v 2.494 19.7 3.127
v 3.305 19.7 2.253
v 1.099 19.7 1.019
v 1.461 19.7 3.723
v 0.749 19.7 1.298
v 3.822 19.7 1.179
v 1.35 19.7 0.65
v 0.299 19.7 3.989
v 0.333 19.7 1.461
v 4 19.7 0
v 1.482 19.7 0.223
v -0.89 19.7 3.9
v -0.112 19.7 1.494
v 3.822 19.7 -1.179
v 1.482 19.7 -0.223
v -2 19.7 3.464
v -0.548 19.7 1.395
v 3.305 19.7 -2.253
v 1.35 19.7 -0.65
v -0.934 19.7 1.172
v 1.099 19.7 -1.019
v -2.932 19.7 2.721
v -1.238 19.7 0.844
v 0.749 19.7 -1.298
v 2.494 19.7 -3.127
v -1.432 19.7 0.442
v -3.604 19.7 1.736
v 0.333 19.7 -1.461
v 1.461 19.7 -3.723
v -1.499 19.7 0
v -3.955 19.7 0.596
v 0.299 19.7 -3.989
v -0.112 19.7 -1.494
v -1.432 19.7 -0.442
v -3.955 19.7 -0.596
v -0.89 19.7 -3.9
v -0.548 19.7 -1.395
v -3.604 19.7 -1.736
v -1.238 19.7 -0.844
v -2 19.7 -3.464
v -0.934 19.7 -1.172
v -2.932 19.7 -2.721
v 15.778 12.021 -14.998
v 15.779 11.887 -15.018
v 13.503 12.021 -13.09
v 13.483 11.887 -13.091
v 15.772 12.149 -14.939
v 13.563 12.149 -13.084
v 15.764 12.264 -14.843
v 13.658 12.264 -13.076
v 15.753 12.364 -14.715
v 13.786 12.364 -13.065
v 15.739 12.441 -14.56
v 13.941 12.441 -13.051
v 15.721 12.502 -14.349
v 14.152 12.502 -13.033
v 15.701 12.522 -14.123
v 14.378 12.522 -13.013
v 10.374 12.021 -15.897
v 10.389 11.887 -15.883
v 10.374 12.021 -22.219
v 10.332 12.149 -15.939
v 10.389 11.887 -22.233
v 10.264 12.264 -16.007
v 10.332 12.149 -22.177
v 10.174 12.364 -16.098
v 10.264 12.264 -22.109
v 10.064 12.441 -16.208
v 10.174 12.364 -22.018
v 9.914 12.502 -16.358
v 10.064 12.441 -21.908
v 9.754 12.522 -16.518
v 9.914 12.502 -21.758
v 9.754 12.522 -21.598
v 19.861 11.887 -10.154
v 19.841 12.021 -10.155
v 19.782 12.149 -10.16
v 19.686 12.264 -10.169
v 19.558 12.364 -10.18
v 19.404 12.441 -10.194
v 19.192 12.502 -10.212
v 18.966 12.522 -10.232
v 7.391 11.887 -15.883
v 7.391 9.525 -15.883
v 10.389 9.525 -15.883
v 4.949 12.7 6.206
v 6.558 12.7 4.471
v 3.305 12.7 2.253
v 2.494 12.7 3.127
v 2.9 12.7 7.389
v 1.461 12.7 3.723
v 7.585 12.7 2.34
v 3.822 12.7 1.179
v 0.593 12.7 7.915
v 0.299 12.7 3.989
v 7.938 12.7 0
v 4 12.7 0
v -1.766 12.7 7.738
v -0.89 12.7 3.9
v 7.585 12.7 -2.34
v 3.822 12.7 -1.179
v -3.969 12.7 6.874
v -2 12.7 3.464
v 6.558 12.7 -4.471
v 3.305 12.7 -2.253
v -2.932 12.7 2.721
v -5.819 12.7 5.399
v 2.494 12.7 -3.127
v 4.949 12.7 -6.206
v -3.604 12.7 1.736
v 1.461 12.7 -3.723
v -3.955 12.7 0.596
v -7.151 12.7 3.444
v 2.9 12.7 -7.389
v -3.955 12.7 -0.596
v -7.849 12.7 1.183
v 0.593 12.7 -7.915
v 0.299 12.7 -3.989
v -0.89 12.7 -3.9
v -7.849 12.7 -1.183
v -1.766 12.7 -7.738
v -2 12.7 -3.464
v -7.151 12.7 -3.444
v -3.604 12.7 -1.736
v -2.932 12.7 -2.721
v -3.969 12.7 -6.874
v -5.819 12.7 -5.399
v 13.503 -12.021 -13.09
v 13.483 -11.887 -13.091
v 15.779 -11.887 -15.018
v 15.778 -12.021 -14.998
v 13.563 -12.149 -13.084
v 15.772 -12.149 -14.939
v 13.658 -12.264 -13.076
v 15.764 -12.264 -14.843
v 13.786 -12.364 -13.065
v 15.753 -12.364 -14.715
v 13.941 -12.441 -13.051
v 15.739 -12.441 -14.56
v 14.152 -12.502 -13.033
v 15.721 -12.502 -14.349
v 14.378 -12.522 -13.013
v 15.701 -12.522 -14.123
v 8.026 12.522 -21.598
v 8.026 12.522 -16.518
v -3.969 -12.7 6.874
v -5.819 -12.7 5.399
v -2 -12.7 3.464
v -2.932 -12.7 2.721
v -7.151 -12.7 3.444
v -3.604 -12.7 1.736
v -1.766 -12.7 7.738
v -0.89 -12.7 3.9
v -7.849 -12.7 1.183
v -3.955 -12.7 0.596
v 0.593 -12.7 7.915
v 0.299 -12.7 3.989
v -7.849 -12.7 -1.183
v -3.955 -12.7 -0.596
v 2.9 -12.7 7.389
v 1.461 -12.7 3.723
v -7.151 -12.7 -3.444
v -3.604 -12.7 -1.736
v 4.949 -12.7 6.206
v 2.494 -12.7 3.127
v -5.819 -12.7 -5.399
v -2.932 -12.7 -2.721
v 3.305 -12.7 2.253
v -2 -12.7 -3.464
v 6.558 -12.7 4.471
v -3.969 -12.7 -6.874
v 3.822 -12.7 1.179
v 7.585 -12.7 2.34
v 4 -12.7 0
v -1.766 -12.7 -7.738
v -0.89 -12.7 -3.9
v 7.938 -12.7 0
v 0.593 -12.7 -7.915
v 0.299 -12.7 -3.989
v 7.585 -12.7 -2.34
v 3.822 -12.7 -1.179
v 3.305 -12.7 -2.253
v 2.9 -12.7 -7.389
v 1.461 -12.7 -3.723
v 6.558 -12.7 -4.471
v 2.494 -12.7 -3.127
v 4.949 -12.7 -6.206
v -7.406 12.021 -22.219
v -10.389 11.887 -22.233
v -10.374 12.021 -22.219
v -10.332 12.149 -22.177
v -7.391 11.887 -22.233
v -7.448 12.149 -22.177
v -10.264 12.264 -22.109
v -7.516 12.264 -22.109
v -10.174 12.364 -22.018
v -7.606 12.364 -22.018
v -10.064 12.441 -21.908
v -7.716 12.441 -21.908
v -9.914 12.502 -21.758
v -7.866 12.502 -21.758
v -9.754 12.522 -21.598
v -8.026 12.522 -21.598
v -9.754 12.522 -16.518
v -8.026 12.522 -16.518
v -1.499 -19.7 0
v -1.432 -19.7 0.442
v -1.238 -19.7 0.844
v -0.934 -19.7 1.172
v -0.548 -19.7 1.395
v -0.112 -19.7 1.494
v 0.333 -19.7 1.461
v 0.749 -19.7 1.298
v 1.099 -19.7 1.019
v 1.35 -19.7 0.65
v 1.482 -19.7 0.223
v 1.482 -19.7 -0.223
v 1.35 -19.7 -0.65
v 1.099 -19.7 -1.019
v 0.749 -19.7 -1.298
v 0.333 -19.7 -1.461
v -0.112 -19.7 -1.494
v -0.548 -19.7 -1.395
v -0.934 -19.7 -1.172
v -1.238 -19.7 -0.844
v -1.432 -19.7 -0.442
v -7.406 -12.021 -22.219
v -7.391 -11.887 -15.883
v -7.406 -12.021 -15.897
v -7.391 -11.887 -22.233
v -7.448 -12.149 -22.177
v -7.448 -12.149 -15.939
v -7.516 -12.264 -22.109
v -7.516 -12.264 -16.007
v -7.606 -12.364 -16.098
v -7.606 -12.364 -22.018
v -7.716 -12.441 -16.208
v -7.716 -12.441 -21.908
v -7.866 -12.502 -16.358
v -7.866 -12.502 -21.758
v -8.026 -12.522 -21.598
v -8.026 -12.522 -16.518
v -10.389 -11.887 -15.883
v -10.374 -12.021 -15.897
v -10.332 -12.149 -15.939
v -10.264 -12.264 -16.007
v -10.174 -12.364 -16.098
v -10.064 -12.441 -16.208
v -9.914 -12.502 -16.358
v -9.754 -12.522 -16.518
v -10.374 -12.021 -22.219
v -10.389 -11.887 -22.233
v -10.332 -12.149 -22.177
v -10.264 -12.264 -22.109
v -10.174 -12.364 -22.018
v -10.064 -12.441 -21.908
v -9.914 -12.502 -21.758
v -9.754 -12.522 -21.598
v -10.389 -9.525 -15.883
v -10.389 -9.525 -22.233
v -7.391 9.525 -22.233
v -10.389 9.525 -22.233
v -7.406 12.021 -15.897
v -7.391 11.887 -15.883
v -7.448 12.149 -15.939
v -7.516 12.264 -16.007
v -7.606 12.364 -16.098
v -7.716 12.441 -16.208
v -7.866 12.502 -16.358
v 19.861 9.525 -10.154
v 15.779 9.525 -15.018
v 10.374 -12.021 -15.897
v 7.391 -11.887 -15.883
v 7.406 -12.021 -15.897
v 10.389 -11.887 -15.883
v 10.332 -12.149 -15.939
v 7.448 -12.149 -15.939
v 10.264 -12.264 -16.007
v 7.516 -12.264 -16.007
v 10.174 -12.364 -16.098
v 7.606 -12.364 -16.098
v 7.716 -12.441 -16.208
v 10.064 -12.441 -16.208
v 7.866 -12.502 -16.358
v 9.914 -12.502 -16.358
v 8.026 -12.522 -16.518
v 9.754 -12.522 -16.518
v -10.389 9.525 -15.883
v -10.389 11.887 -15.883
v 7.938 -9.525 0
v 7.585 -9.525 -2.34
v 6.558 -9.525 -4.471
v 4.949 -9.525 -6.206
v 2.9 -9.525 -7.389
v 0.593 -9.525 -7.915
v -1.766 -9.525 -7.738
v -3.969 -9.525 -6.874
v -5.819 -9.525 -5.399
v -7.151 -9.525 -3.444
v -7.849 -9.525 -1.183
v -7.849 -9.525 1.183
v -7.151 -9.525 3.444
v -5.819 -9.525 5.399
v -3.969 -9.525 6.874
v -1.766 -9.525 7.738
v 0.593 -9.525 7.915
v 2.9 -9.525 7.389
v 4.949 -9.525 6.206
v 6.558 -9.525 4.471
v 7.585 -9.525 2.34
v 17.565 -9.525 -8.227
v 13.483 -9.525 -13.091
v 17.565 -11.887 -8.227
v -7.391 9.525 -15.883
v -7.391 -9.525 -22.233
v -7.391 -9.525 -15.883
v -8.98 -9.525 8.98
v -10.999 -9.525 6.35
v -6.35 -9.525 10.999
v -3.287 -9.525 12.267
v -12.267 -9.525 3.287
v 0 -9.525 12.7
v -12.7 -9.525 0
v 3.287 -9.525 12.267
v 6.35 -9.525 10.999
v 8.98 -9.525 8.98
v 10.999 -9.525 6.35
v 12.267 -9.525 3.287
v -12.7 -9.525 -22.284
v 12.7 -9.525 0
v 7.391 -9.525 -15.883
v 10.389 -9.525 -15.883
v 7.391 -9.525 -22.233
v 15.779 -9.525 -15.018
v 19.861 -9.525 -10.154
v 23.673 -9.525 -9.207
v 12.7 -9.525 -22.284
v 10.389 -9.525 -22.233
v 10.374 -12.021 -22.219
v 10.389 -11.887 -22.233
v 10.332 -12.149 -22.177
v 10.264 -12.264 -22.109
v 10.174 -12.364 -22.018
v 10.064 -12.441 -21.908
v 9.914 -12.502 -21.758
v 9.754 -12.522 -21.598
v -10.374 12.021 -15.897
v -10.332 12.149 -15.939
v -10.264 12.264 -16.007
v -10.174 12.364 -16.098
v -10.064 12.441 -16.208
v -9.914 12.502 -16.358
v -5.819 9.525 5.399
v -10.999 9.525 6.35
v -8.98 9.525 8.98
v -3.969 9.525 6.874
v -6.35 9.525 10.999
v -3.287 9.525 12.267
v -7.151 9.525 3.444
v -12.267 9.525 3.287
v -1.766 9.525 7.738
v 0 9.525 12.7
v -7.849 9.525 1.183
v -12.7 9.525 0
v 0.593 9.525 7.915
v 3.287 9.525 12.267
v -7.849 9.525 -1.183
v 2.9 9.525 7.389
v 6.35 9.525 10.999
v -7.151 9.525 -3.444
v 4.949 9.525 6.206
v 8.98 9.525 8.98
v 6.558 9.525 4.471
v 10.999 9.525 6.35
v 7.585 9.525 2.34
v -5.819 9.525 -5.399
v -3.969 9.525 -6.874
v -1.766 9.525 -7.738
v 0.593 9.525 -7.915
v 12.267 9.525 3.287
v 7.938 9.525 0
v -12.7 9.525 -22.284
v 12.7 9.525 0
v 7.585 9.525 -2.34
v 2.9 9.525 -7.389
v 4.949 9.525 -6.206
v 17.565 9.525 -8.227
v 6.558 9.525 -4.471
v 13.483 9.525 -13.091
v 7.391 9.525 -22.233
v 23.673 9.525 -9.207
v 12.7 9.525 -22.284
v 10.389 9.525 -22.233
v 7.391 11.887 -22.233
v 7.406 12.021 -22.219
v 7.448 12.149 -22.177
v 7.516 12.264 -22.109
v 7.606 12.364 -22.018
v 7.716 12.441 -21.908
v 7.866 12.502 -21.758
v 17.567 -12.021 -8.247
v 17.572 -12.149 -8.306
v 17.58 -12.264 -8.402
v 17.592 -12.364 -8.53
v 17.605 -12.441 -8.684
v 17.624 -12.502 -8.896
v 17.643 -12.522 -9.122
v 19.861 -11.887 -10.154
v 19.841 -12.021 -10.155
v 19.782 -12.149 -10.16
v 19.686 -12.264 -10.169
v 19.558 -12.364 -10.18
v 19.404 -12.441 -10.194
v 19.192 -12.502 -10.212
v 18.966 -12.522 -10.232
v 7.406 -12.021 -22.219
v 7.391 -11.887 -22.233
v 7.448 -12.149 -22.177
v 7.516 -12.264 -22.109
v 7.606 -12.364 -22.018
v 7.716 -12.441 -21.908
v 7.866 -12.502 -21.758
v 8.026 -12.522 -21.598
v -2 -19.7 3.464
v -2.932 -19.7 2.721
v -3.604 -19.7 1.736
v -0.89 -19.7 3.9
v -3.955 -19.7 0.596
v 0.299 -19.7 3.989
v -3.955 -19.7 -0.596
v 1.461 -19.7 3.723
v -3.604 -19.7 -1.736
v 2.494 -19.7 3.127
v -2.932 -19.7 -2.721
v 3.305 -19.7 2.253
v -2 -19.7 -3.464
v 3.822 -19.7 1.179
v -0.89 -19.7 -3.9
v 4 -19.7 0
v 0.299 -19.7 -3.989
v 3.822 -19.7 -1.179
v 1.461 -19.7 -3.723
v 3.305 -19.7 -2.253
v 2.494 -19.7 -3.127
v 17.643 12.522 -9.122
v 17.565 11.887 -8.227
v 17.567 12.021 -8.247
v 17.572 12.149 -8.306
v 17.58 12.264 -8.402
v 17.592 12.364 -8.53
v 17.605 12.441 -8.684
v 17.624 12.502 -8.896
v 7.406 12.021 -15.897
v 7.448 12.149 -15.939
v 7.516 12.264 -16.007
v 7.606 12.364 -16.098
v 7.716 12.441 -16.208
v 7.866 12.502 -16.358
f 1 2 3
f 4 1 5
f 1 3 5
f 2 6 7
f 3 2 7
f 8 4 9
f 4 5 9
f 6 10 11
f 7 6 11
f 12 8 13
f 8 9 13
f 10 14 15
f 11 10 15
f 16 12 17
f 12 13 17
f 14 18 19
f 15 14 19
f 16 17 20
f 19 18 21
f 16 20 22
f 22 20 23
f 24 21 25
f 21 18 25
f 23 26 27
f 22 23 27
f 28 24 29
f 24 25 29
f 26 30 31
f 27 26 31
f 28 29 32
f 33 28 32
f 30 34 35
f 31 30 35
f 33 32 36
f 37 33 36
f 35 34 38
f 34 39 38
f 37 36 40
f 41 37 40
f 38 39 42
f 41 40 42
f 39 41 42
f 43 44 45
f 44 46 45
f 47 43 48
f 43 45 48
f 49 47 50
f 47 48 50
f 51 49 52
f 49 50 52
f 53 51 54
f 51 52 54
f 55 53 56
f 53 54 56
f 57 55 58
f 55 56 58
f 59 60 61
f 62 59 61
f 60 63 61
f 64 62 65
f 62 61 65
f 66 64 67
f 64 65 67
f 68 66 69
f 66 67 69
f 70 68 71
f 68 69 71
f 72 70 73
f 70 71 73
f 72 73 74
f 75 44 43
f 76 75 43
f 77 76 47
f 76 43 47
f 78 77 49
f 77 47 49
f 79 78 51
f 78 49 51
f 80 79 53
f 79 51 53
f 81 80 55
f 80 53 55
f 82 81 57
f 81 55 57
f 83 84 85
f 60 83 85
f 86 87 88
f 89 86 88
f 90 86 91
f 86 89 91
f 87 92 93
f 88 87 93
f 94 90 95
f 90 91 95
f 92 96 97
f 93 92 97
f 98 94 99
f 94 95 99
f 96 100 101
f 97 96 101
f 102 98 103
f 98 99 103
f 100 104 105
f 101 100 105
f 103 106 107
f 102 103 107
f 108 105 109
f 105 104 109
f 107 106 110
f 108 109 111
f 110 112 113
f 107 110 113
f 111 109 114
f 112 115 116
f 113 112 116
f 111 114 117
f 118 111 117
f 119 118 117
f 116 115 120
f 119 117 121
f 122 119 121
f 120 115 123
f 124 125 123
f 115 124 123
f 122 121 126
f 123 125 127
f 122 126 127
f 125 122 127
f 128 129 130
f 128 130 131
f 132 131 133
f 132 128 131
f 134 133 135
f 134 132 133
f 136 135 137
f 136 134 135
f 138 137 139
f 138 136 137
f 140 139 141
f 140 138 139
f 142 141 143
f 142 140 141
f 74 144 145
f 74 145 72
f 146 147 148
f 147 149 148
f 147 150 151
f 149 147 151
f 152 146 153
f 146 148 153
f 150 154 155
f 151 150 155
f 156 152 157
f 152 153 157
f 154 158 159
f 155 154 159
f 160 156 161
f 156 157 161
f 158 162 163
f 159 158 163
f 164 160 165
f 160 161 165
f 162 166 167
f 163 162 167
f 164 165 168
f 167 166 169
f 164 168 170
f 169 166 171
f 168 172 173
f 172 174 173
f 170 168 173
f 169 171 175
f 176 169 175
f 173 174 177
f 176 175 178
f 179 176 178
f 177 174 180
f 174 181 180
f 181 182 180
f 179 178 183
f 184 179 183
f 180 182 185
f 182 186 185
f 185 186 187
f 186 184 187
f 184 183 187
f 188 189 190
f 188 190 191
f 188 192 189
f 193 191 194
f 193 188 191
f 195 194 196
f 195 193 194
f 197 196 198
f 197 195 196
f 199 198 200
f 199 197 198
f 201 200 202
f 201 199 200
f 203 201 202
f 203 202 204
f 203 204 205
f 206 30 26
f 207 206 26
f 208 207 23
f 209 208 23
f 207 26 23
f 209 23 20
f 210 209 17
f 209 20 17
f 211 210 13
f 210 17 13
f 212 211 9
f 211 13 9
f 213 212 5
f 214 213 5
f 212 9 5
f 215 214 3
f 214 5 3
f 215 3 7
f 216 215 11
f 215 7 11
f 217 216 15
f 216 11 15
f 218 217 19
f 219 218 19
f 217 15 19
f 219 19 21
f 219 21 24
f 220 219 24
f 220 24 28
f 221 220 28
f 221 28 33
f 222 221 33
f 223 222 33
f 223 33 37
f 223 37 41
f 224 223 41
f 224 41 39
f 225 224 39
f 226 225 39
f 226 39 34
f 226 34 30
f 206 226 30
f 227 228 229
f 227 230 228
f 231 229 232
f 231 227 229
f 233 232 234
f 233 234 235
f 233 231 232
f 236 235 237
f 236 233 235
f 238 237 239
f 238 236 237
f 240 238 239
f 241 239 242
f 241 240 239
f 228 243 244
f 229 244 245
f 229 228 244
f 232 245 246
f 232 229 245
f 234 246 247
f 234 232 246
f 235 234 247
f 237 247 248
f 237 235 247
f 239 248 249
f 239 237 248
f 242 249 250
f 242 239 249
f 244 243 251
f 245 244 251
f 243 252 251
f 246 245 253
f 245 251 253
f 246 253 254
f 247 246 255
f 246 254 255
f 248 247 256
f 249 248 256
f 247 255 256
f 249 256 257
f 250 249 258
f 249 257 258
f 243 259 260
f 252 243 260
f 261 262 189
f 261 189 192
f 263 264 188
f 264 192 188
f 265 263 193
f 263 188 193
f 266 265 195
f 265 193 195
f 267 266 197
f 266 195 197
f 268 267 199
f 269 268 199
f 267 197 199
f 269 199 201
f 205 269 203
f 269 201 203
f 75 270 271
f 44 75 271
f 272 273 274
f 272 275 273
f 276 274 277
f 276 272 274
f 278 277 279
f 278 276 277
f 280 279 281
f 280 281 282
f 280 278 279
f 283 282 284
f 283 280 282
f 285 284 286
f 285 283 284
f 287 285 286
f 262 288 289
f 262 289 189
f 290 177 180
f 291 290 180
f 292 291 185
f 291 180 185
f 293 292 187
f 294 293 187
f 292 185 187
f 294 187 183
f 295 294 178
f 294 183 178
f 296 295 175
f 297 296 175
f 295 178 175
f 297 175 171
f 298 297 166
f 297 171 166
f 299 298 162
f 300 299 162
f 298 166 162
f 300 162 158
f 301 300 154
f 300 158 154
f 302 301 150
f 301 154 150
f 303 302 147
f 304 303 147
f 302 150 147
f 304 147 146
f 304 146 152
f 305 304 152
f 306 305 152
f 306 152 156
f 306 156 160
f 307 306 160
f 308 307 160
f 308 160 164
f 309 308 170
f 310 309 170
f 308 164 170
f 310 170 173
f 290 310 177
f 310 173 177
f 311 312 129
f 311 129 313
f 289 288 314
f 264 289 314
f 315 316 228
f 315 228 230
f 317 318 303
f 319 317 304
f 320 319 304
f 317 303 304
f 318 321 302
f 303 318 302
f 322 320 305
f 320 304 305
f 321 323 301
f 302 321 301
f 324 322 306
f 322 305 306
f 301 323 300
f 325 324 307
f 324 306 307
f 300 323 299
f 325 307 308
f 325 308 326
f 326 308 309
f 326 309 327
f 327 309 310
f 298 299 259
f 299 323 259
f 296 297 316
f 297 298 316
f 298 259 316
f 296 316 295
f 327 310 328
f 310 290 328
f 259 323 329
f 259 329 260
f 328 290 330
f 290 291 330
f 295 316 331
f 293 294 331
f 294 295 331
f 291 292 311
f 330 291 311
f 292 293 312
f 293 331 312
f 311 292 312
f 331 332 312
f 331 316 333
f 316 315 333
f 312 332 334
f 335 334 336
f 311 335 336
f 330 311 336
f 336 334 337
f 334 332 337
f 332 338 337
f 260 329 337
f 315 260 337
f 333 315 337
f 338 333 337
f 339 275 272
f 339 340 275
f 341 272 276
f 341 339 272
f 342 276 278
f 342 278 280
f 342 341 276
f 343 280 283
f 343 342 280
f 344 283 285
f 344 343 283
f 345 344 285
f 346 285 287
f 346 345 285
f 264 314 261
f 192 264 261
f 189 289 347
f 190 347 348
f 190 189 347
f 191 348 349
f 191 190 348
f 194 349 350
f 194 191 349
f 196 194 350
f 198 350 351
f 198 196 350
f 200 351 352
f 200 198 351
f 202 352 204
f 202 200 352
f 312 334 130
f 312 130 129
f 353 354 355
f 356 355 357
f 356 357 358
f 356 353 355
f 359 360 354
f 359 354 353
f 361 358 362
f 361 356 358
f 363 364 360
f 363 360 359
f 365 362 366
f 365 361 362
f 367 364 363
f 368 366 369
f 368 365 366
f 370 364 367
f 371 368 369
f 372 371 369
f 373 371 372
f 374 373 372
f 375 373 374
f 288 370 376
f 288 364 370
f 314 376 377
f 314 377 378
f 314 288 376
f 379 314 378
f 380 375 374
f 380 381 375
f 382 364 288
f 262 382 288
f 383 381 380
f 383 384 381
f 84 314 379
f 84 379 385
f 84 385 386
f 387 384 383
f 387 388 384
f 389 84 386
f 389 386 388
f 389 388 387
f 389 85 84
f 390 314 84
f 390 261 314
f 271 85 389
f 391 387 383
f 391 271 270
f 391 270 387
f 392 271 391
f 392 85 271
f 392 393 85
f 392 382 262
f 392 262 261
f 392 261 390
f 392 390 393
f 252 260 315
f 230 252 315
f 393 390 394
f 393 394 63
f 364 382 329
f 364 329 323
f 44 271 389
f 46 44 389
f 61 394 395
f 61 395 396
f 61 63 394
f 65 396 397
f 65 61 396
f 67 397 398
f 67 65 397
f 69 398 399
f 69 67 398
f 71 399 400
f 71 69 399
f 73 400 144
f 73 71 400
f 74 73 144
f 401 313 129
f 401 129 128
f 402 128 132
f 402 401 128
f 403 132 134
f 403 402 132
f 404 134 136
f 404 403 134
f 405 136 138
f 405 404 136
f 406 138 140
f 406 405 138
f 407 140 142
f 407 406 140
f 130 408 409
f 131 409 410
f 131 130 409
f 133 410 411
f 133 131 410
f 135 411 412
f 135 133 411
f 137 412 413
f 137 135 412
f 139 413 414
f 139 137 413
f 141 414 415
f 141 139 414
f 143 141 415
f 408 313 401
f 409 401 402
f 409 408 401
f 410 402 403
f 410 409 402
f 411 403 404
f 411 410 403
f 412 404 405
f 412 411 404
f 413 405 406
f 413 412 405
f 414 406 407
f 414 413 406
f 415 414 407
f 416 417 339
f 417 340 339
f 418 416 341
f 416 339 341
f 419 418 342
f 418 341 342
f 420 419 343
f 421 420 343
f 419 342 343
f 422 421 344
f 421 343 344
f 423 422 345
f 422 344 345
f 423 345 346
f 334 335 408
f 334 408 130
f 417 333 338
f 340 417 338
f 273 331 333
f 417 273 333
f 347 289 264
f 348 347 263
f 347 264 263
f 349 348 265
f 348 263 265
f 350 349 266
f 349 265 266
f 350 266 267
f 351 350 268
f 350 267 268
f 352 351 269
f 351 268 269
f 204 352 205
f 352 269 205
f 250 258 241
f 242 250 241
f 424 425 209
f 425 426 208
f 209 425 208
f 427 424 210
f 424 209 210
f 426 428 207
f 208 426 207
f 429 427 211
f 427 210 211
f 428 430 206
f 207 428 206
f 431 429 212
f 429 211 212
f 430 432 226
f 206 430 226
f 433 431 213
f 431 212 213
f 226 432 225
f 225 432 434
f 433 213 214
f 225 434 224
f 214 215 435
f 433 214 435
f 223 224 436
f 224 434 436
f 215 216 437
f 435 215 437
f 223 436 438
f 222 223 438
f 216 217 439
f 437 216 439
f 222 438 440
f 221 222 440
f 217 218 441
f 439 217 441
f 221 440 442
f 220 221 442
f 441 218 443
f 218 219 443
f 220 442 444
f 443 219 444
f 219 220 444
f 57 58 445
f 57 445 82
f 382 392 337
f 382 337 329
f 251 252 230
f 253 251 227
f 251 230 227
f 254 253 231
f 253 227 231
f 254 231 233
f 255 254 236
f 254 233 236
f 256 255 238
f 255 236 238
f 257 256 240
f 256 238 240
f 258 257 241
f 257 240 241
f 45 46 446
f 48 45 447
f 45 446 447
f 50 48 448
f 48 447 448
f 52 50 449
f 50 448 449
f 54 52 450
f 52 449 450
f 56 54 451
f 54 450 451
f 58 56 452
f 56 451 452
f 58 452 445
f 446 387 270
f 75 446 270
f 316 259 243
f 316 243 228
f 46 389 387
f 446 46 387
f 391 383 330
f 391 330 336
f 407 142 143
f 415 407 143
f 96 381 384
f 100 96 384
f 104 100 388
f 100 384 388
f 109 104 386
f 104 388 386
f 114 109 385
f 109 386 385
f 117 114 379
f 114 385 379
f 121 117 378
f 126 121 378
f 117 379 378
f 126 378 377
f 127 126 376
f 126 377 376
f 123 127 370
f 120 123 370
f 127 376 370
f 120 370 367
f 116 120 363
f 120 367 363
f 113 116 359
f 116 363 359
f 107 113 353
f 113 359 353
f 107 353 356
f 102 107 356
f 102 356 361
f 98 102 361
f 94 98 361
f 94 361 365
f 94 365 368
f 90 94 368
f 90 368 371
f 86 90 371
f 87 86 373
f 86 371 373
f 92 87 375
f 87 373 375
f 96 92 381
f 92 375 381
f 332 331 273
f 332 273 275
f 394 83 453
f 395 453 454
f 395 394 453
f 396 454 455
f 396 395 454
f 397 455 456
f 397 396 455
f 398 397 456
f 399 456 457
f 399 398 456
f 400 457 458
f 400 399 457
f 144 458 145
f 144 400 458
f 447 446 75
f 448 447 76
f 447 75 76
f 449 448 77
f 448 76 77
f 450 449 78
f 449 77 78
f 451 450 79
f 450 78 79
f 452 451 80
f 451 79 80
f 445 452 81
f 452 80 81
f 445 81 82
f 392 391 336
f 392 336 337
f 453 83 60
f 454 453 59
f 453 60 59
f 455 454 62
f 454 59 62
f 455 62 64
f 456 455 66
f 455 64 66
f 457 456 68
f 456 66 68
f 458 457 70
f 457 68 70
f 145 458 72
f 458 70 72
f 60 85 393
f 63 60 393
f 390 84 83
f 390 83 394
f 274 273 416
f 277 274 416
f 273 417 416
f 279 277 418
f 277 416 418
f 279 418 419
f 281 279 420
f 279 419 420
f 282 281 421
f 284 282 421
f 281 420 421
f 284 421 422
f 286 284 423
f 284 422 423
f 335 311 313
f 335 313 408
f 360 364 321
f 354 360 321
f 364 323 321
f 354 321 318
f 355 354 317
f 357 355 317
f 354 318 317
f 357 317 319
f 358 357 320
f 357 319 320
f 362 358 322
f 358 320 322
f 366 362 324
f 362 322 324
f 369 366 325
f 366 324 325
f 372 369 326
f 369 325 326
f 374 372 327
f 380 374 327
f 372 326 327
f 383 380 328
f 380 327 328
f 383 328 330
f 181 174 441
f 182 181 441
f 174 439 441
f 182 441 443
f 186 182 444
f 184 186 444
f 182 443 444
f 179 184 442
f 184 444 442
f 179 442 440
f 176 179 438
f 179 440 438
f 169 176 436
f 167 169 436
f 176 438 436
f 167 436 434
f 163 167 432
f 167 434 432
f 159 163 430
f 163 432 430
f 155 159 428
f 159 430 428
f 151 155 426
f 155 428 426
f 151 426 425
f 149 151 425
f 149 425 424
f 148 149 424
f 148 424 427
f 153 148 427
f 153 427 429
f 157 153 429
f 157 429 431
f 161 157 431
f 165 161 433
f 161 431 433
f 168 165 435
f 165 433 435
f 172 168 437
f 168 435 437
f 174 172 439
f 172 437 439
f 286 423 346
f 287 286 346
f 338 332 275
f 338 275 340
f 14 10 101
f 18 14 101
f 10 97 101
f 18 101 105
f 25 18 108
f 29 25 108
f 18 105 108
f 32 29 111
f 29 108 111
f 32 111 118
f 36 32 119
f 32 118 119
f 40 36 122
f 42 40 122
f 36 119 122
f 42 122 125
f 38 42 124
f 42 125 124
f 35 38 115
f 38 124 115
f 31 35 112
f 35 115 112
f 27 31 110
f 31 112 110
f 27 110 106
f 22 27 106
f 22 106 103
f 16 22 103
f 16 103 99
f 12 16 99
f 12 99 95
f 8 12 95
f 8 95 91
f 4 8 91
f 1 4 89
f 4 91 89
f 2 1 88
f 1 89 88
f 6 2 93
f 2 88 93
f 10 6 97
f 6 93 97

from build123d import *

# Parameters (mm, degrees)
BOSS_EXTRUDE1_DEPTH  = 19.05
SKETCH3_R            = 1.4986
CUT_EXTRUDE1_DEPTH   = 52.081415314
BOSS_EXTRUDE2_DEPTH  = 2.9972
SKETCH5_W            = 2.9972
SKETCH5_H            = 6.35
BOSS_EXTRUDE3_DEPTH  = 2.9972
FILLET1_R            = 0.635
FILLET1_OF_MIRROR1_R = 0.635


with BuildPart() as part:
    # Sketch1 → Revolve1 (revolve)
    with BuildSketch(Plane.XY, mode=Mode.PRIVATE) as revolve1_sk:
        Polygon((-4, -19.7), (0, -19.7), (0, 19.7), (-4, 19.7), (-4, 12.7), (-7.9375, 12.7), (-7.9375, 9.525), (-12.7, 9.525), (-12.7, -9.525), (-7.9375, -9.525), (-7.9375, -12.7), (-4, -12.7), align=None)
    revolve(revolve1_sk.sketch.rotate(Axis((0, 0, 0), (0, 1, 0)), 180), axis=Axis((0, 0, 0), (0, 1, 0)))

    # Sketch2 → Boss-Extrude1 (add)
    with BuildSketch(Plane(origin=(0, 9.525, 0), x_dir=(1, 0, 0), z_dir=(0, 1, 0))):
        Polygon((12.7, 0), (23.672555951, 9.207067652), (12.7, 22.283650626), (-12.7, 22.283650626), (-12.7, 0), align=None)
    extrude(amount=-BOSS_EXTRUDE1_DEPTH)

    # Sketch3 → Cut-Extrude1 (cut, through all)
    with BuildSketch(Plane(origin=(0, 19.7, 0), x_dir=(1, 0, 0), z_dir=(0, 1, 0))):
        with Locations(Location((0, 0, 0), (0, 0, 180))):
            Circle(SKETCH3_R)
    extrude(amount=-CUT_EXTRUDE1_DEPTH, mode=Mode.SUBTRACT)

    # Sketch4 → Boss-Extrude2 (add)
    with BuildSketch(Plane(origin=(0, 9.525, 0), x_dir=(1, 0, 0), z_dir=(0, 1, 0))):
        Polygon((15.779368843, 15.017901691), (13.483380438, 13.091338668), (17.56508176, 8.226956454), (19.861070165, 10.153519478), align=None)
    boss_extrude2 = extrude(amount=BOSS_EXTRUDE2_DEPTH)

    # Sketch5 → Boss-Extrude3 (add)
    with BuildSketch(Plane(origin=(0, 9.525, 0), x_dir=(1, 0, 0), z_dir=(0, 1, 0))):
        with Locations((-8.89, 19.057850626)):
            Rectangle(SKETCH5_W, SKETCH5_H)
        with Locations((8.89, 19.057850626)):
            Rectangle(SKETCH5_W, SKETCH5_H)
    boss_extrude3 = extrude(amount=BOSS_EXTRUDE3_DEPTH)

    # Fillet1
    fillet1_edges = [part.edges().sort_by_distance(p)[0] for p in [
        (-7.3914, 12.5222, -19.057850626),
        (-8.89, 12.5222, -22.232850626),
        (-10.3886, 12.5222, -19.057850626),
        (-8.89, 12.5222, -15.882850626),
        (10.3886, 12.5222, -19.057850626),
        (8.89, 12.5222, -22.232850626),
        (7.3914, 12.5222, -19.057850626),
        (8.89, 12.5222, -15.882850626),
        (17.820219504, 12.5222, -12.585710584),
        (14.631374641, 12.5222, -14.054620179),
        (15.524231099, 12.5222, -10.659147561),
        (18.713075962, 12.5222, -9.190237966),
    ]]
    fillet(fillet1_edges, radius=FILLET1_R)

    # Mirror1: Boss-Extrude2, Boss-Extrude3 across plane
    add(boss_extrude2.mirror(Plane.ZX))
    add(boss_extrude3.mirror(Plane.ZX))

    # Fillet1 of Mirror1
    fillet1_of_mirror1_edges = [part.edges().sort_by_distance(p)[0] for p in [
        (-7.3914, -12.5222, -19.057850626),
        (-8.89, -12.5222, -22.232850626),
        (-10.3886, -12.5222, -19.057850626),
        (-8.89, -12.5222, -15.882850626),
        (10.3886, -12.5222, -19.057850626),
        (8.89, -12.5222, -22.232850626),
        (7.3914, -12.5222, -19.057850626),
        (8.89, -12.5222, -15.882850626),
        (17.820219504, -12.5222, -12.585710584),
        (14.631374641, -12.5222, -14.054620179),
        (15.524231099, -12.5222, -10.659147561),
        (18.713075962, -12.5222, -9.190237966),
    ]]
    fillet(fillet1_of_mirror1_edges, radius=FILLET1_OF_MIRROR1_R)


solid = part.part
